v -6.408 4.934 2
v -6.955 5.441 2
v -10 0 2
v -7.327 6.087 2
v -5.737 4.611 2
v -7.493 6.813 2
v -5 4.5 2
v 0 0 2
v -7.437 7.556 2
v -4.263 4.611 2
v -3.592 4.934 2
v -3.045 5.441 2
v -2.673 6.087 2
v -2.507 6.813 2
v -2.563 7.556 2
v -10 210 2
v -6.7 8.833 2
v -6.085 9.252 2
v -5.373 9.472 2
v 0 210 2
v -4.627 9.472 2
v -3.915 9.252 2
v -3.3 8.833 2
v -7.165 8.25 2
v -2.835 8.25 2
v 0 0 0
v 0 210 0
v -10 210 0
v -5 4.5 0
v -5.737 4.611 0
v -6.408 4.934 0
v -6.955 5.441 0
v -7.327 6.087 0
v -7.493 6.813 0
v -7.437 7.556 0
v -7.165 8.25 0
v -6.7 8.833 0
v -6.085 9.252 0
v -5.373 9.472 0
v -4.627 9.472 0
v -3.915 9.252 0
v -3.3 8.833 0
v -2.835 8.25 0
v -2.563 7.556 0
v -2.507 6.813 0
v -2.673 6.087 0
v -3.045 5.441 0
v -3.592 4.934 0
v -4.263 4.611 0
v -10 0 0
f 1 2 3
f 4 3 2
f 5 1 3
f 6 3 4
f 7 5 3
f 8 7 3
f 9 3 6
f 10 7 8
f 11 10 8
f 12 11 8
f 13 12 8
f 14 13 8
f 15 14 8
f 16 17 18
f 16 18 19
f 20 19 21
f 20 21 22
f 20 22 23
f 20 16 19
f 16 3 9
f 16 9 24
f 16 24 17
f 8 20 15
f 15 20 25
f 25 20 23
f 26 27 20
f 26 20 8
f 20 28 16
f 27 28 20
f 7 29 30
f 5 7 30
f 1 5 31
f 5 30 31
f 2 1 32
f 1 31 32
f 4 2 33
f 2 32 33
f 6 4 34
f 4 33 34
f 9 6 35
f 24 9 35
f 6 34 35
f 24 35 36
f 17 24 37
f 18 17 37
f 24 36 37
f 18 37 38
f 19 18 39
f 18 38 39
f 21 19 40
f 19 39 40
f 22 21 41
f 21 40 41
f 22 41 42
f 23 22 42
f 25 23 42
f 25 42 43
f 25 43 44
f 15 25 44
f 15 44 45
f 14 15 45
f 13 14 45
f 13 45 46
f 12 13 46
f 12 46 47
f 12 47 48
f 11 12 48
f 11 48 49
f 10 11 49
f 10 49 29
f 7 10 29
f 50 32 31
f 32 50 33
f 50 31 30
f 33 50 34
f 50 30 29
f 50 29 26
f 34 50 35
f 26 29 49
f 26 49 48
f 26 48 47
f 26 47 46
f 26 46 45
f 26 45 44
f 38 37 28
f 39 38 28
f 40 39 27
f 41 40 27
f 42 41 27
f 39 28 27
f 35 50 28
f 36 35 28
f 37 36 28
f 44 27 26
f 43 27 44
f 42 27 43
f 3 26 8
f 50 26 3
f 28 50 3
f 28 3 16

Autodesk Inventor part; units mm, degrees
ref_plane "YZ Plane" through (0, 0, 0) normal (1, 0, 0) x (0, 1, 0)
ref_plane "XZ Plane" through (0, 0, 0) normal (0, 1, 0) x (-1, 0, 0)
ref_plane "XY Plane" through (0, 0, 0) normal (0, 0, 1) x (1, 0, 0)
sketch "Sketch2" plane through (0, 0, 0) normal (0, 0, 1) x (1, 0, 0)
  line L0 (0, 0) -> (-10, 0)
  line L1 (-10, 0) -> (-10, 210)
  line L2 (-10, 210) -> (0, 210)
  line L3 (0, 210) -> (0, 0)
  point P0 (-5, 18)
  dimension "d4" = 10
  dimension "d5" = 210
extrude "Extrusion2" add sketch "Sketch2" along normal blind 2
sketch "Sketch3" plane through (0, 0, 2) normal (0, 0, 1) x (1, 0, 0)
  point P0 (0, 0)
  point P1 (-5, 7)
hole "Hole2" at (-5, 7, 2) direction (0, 0, -1) diameter 5 depth 5
properties part number "Circle_TestFit_V1"
